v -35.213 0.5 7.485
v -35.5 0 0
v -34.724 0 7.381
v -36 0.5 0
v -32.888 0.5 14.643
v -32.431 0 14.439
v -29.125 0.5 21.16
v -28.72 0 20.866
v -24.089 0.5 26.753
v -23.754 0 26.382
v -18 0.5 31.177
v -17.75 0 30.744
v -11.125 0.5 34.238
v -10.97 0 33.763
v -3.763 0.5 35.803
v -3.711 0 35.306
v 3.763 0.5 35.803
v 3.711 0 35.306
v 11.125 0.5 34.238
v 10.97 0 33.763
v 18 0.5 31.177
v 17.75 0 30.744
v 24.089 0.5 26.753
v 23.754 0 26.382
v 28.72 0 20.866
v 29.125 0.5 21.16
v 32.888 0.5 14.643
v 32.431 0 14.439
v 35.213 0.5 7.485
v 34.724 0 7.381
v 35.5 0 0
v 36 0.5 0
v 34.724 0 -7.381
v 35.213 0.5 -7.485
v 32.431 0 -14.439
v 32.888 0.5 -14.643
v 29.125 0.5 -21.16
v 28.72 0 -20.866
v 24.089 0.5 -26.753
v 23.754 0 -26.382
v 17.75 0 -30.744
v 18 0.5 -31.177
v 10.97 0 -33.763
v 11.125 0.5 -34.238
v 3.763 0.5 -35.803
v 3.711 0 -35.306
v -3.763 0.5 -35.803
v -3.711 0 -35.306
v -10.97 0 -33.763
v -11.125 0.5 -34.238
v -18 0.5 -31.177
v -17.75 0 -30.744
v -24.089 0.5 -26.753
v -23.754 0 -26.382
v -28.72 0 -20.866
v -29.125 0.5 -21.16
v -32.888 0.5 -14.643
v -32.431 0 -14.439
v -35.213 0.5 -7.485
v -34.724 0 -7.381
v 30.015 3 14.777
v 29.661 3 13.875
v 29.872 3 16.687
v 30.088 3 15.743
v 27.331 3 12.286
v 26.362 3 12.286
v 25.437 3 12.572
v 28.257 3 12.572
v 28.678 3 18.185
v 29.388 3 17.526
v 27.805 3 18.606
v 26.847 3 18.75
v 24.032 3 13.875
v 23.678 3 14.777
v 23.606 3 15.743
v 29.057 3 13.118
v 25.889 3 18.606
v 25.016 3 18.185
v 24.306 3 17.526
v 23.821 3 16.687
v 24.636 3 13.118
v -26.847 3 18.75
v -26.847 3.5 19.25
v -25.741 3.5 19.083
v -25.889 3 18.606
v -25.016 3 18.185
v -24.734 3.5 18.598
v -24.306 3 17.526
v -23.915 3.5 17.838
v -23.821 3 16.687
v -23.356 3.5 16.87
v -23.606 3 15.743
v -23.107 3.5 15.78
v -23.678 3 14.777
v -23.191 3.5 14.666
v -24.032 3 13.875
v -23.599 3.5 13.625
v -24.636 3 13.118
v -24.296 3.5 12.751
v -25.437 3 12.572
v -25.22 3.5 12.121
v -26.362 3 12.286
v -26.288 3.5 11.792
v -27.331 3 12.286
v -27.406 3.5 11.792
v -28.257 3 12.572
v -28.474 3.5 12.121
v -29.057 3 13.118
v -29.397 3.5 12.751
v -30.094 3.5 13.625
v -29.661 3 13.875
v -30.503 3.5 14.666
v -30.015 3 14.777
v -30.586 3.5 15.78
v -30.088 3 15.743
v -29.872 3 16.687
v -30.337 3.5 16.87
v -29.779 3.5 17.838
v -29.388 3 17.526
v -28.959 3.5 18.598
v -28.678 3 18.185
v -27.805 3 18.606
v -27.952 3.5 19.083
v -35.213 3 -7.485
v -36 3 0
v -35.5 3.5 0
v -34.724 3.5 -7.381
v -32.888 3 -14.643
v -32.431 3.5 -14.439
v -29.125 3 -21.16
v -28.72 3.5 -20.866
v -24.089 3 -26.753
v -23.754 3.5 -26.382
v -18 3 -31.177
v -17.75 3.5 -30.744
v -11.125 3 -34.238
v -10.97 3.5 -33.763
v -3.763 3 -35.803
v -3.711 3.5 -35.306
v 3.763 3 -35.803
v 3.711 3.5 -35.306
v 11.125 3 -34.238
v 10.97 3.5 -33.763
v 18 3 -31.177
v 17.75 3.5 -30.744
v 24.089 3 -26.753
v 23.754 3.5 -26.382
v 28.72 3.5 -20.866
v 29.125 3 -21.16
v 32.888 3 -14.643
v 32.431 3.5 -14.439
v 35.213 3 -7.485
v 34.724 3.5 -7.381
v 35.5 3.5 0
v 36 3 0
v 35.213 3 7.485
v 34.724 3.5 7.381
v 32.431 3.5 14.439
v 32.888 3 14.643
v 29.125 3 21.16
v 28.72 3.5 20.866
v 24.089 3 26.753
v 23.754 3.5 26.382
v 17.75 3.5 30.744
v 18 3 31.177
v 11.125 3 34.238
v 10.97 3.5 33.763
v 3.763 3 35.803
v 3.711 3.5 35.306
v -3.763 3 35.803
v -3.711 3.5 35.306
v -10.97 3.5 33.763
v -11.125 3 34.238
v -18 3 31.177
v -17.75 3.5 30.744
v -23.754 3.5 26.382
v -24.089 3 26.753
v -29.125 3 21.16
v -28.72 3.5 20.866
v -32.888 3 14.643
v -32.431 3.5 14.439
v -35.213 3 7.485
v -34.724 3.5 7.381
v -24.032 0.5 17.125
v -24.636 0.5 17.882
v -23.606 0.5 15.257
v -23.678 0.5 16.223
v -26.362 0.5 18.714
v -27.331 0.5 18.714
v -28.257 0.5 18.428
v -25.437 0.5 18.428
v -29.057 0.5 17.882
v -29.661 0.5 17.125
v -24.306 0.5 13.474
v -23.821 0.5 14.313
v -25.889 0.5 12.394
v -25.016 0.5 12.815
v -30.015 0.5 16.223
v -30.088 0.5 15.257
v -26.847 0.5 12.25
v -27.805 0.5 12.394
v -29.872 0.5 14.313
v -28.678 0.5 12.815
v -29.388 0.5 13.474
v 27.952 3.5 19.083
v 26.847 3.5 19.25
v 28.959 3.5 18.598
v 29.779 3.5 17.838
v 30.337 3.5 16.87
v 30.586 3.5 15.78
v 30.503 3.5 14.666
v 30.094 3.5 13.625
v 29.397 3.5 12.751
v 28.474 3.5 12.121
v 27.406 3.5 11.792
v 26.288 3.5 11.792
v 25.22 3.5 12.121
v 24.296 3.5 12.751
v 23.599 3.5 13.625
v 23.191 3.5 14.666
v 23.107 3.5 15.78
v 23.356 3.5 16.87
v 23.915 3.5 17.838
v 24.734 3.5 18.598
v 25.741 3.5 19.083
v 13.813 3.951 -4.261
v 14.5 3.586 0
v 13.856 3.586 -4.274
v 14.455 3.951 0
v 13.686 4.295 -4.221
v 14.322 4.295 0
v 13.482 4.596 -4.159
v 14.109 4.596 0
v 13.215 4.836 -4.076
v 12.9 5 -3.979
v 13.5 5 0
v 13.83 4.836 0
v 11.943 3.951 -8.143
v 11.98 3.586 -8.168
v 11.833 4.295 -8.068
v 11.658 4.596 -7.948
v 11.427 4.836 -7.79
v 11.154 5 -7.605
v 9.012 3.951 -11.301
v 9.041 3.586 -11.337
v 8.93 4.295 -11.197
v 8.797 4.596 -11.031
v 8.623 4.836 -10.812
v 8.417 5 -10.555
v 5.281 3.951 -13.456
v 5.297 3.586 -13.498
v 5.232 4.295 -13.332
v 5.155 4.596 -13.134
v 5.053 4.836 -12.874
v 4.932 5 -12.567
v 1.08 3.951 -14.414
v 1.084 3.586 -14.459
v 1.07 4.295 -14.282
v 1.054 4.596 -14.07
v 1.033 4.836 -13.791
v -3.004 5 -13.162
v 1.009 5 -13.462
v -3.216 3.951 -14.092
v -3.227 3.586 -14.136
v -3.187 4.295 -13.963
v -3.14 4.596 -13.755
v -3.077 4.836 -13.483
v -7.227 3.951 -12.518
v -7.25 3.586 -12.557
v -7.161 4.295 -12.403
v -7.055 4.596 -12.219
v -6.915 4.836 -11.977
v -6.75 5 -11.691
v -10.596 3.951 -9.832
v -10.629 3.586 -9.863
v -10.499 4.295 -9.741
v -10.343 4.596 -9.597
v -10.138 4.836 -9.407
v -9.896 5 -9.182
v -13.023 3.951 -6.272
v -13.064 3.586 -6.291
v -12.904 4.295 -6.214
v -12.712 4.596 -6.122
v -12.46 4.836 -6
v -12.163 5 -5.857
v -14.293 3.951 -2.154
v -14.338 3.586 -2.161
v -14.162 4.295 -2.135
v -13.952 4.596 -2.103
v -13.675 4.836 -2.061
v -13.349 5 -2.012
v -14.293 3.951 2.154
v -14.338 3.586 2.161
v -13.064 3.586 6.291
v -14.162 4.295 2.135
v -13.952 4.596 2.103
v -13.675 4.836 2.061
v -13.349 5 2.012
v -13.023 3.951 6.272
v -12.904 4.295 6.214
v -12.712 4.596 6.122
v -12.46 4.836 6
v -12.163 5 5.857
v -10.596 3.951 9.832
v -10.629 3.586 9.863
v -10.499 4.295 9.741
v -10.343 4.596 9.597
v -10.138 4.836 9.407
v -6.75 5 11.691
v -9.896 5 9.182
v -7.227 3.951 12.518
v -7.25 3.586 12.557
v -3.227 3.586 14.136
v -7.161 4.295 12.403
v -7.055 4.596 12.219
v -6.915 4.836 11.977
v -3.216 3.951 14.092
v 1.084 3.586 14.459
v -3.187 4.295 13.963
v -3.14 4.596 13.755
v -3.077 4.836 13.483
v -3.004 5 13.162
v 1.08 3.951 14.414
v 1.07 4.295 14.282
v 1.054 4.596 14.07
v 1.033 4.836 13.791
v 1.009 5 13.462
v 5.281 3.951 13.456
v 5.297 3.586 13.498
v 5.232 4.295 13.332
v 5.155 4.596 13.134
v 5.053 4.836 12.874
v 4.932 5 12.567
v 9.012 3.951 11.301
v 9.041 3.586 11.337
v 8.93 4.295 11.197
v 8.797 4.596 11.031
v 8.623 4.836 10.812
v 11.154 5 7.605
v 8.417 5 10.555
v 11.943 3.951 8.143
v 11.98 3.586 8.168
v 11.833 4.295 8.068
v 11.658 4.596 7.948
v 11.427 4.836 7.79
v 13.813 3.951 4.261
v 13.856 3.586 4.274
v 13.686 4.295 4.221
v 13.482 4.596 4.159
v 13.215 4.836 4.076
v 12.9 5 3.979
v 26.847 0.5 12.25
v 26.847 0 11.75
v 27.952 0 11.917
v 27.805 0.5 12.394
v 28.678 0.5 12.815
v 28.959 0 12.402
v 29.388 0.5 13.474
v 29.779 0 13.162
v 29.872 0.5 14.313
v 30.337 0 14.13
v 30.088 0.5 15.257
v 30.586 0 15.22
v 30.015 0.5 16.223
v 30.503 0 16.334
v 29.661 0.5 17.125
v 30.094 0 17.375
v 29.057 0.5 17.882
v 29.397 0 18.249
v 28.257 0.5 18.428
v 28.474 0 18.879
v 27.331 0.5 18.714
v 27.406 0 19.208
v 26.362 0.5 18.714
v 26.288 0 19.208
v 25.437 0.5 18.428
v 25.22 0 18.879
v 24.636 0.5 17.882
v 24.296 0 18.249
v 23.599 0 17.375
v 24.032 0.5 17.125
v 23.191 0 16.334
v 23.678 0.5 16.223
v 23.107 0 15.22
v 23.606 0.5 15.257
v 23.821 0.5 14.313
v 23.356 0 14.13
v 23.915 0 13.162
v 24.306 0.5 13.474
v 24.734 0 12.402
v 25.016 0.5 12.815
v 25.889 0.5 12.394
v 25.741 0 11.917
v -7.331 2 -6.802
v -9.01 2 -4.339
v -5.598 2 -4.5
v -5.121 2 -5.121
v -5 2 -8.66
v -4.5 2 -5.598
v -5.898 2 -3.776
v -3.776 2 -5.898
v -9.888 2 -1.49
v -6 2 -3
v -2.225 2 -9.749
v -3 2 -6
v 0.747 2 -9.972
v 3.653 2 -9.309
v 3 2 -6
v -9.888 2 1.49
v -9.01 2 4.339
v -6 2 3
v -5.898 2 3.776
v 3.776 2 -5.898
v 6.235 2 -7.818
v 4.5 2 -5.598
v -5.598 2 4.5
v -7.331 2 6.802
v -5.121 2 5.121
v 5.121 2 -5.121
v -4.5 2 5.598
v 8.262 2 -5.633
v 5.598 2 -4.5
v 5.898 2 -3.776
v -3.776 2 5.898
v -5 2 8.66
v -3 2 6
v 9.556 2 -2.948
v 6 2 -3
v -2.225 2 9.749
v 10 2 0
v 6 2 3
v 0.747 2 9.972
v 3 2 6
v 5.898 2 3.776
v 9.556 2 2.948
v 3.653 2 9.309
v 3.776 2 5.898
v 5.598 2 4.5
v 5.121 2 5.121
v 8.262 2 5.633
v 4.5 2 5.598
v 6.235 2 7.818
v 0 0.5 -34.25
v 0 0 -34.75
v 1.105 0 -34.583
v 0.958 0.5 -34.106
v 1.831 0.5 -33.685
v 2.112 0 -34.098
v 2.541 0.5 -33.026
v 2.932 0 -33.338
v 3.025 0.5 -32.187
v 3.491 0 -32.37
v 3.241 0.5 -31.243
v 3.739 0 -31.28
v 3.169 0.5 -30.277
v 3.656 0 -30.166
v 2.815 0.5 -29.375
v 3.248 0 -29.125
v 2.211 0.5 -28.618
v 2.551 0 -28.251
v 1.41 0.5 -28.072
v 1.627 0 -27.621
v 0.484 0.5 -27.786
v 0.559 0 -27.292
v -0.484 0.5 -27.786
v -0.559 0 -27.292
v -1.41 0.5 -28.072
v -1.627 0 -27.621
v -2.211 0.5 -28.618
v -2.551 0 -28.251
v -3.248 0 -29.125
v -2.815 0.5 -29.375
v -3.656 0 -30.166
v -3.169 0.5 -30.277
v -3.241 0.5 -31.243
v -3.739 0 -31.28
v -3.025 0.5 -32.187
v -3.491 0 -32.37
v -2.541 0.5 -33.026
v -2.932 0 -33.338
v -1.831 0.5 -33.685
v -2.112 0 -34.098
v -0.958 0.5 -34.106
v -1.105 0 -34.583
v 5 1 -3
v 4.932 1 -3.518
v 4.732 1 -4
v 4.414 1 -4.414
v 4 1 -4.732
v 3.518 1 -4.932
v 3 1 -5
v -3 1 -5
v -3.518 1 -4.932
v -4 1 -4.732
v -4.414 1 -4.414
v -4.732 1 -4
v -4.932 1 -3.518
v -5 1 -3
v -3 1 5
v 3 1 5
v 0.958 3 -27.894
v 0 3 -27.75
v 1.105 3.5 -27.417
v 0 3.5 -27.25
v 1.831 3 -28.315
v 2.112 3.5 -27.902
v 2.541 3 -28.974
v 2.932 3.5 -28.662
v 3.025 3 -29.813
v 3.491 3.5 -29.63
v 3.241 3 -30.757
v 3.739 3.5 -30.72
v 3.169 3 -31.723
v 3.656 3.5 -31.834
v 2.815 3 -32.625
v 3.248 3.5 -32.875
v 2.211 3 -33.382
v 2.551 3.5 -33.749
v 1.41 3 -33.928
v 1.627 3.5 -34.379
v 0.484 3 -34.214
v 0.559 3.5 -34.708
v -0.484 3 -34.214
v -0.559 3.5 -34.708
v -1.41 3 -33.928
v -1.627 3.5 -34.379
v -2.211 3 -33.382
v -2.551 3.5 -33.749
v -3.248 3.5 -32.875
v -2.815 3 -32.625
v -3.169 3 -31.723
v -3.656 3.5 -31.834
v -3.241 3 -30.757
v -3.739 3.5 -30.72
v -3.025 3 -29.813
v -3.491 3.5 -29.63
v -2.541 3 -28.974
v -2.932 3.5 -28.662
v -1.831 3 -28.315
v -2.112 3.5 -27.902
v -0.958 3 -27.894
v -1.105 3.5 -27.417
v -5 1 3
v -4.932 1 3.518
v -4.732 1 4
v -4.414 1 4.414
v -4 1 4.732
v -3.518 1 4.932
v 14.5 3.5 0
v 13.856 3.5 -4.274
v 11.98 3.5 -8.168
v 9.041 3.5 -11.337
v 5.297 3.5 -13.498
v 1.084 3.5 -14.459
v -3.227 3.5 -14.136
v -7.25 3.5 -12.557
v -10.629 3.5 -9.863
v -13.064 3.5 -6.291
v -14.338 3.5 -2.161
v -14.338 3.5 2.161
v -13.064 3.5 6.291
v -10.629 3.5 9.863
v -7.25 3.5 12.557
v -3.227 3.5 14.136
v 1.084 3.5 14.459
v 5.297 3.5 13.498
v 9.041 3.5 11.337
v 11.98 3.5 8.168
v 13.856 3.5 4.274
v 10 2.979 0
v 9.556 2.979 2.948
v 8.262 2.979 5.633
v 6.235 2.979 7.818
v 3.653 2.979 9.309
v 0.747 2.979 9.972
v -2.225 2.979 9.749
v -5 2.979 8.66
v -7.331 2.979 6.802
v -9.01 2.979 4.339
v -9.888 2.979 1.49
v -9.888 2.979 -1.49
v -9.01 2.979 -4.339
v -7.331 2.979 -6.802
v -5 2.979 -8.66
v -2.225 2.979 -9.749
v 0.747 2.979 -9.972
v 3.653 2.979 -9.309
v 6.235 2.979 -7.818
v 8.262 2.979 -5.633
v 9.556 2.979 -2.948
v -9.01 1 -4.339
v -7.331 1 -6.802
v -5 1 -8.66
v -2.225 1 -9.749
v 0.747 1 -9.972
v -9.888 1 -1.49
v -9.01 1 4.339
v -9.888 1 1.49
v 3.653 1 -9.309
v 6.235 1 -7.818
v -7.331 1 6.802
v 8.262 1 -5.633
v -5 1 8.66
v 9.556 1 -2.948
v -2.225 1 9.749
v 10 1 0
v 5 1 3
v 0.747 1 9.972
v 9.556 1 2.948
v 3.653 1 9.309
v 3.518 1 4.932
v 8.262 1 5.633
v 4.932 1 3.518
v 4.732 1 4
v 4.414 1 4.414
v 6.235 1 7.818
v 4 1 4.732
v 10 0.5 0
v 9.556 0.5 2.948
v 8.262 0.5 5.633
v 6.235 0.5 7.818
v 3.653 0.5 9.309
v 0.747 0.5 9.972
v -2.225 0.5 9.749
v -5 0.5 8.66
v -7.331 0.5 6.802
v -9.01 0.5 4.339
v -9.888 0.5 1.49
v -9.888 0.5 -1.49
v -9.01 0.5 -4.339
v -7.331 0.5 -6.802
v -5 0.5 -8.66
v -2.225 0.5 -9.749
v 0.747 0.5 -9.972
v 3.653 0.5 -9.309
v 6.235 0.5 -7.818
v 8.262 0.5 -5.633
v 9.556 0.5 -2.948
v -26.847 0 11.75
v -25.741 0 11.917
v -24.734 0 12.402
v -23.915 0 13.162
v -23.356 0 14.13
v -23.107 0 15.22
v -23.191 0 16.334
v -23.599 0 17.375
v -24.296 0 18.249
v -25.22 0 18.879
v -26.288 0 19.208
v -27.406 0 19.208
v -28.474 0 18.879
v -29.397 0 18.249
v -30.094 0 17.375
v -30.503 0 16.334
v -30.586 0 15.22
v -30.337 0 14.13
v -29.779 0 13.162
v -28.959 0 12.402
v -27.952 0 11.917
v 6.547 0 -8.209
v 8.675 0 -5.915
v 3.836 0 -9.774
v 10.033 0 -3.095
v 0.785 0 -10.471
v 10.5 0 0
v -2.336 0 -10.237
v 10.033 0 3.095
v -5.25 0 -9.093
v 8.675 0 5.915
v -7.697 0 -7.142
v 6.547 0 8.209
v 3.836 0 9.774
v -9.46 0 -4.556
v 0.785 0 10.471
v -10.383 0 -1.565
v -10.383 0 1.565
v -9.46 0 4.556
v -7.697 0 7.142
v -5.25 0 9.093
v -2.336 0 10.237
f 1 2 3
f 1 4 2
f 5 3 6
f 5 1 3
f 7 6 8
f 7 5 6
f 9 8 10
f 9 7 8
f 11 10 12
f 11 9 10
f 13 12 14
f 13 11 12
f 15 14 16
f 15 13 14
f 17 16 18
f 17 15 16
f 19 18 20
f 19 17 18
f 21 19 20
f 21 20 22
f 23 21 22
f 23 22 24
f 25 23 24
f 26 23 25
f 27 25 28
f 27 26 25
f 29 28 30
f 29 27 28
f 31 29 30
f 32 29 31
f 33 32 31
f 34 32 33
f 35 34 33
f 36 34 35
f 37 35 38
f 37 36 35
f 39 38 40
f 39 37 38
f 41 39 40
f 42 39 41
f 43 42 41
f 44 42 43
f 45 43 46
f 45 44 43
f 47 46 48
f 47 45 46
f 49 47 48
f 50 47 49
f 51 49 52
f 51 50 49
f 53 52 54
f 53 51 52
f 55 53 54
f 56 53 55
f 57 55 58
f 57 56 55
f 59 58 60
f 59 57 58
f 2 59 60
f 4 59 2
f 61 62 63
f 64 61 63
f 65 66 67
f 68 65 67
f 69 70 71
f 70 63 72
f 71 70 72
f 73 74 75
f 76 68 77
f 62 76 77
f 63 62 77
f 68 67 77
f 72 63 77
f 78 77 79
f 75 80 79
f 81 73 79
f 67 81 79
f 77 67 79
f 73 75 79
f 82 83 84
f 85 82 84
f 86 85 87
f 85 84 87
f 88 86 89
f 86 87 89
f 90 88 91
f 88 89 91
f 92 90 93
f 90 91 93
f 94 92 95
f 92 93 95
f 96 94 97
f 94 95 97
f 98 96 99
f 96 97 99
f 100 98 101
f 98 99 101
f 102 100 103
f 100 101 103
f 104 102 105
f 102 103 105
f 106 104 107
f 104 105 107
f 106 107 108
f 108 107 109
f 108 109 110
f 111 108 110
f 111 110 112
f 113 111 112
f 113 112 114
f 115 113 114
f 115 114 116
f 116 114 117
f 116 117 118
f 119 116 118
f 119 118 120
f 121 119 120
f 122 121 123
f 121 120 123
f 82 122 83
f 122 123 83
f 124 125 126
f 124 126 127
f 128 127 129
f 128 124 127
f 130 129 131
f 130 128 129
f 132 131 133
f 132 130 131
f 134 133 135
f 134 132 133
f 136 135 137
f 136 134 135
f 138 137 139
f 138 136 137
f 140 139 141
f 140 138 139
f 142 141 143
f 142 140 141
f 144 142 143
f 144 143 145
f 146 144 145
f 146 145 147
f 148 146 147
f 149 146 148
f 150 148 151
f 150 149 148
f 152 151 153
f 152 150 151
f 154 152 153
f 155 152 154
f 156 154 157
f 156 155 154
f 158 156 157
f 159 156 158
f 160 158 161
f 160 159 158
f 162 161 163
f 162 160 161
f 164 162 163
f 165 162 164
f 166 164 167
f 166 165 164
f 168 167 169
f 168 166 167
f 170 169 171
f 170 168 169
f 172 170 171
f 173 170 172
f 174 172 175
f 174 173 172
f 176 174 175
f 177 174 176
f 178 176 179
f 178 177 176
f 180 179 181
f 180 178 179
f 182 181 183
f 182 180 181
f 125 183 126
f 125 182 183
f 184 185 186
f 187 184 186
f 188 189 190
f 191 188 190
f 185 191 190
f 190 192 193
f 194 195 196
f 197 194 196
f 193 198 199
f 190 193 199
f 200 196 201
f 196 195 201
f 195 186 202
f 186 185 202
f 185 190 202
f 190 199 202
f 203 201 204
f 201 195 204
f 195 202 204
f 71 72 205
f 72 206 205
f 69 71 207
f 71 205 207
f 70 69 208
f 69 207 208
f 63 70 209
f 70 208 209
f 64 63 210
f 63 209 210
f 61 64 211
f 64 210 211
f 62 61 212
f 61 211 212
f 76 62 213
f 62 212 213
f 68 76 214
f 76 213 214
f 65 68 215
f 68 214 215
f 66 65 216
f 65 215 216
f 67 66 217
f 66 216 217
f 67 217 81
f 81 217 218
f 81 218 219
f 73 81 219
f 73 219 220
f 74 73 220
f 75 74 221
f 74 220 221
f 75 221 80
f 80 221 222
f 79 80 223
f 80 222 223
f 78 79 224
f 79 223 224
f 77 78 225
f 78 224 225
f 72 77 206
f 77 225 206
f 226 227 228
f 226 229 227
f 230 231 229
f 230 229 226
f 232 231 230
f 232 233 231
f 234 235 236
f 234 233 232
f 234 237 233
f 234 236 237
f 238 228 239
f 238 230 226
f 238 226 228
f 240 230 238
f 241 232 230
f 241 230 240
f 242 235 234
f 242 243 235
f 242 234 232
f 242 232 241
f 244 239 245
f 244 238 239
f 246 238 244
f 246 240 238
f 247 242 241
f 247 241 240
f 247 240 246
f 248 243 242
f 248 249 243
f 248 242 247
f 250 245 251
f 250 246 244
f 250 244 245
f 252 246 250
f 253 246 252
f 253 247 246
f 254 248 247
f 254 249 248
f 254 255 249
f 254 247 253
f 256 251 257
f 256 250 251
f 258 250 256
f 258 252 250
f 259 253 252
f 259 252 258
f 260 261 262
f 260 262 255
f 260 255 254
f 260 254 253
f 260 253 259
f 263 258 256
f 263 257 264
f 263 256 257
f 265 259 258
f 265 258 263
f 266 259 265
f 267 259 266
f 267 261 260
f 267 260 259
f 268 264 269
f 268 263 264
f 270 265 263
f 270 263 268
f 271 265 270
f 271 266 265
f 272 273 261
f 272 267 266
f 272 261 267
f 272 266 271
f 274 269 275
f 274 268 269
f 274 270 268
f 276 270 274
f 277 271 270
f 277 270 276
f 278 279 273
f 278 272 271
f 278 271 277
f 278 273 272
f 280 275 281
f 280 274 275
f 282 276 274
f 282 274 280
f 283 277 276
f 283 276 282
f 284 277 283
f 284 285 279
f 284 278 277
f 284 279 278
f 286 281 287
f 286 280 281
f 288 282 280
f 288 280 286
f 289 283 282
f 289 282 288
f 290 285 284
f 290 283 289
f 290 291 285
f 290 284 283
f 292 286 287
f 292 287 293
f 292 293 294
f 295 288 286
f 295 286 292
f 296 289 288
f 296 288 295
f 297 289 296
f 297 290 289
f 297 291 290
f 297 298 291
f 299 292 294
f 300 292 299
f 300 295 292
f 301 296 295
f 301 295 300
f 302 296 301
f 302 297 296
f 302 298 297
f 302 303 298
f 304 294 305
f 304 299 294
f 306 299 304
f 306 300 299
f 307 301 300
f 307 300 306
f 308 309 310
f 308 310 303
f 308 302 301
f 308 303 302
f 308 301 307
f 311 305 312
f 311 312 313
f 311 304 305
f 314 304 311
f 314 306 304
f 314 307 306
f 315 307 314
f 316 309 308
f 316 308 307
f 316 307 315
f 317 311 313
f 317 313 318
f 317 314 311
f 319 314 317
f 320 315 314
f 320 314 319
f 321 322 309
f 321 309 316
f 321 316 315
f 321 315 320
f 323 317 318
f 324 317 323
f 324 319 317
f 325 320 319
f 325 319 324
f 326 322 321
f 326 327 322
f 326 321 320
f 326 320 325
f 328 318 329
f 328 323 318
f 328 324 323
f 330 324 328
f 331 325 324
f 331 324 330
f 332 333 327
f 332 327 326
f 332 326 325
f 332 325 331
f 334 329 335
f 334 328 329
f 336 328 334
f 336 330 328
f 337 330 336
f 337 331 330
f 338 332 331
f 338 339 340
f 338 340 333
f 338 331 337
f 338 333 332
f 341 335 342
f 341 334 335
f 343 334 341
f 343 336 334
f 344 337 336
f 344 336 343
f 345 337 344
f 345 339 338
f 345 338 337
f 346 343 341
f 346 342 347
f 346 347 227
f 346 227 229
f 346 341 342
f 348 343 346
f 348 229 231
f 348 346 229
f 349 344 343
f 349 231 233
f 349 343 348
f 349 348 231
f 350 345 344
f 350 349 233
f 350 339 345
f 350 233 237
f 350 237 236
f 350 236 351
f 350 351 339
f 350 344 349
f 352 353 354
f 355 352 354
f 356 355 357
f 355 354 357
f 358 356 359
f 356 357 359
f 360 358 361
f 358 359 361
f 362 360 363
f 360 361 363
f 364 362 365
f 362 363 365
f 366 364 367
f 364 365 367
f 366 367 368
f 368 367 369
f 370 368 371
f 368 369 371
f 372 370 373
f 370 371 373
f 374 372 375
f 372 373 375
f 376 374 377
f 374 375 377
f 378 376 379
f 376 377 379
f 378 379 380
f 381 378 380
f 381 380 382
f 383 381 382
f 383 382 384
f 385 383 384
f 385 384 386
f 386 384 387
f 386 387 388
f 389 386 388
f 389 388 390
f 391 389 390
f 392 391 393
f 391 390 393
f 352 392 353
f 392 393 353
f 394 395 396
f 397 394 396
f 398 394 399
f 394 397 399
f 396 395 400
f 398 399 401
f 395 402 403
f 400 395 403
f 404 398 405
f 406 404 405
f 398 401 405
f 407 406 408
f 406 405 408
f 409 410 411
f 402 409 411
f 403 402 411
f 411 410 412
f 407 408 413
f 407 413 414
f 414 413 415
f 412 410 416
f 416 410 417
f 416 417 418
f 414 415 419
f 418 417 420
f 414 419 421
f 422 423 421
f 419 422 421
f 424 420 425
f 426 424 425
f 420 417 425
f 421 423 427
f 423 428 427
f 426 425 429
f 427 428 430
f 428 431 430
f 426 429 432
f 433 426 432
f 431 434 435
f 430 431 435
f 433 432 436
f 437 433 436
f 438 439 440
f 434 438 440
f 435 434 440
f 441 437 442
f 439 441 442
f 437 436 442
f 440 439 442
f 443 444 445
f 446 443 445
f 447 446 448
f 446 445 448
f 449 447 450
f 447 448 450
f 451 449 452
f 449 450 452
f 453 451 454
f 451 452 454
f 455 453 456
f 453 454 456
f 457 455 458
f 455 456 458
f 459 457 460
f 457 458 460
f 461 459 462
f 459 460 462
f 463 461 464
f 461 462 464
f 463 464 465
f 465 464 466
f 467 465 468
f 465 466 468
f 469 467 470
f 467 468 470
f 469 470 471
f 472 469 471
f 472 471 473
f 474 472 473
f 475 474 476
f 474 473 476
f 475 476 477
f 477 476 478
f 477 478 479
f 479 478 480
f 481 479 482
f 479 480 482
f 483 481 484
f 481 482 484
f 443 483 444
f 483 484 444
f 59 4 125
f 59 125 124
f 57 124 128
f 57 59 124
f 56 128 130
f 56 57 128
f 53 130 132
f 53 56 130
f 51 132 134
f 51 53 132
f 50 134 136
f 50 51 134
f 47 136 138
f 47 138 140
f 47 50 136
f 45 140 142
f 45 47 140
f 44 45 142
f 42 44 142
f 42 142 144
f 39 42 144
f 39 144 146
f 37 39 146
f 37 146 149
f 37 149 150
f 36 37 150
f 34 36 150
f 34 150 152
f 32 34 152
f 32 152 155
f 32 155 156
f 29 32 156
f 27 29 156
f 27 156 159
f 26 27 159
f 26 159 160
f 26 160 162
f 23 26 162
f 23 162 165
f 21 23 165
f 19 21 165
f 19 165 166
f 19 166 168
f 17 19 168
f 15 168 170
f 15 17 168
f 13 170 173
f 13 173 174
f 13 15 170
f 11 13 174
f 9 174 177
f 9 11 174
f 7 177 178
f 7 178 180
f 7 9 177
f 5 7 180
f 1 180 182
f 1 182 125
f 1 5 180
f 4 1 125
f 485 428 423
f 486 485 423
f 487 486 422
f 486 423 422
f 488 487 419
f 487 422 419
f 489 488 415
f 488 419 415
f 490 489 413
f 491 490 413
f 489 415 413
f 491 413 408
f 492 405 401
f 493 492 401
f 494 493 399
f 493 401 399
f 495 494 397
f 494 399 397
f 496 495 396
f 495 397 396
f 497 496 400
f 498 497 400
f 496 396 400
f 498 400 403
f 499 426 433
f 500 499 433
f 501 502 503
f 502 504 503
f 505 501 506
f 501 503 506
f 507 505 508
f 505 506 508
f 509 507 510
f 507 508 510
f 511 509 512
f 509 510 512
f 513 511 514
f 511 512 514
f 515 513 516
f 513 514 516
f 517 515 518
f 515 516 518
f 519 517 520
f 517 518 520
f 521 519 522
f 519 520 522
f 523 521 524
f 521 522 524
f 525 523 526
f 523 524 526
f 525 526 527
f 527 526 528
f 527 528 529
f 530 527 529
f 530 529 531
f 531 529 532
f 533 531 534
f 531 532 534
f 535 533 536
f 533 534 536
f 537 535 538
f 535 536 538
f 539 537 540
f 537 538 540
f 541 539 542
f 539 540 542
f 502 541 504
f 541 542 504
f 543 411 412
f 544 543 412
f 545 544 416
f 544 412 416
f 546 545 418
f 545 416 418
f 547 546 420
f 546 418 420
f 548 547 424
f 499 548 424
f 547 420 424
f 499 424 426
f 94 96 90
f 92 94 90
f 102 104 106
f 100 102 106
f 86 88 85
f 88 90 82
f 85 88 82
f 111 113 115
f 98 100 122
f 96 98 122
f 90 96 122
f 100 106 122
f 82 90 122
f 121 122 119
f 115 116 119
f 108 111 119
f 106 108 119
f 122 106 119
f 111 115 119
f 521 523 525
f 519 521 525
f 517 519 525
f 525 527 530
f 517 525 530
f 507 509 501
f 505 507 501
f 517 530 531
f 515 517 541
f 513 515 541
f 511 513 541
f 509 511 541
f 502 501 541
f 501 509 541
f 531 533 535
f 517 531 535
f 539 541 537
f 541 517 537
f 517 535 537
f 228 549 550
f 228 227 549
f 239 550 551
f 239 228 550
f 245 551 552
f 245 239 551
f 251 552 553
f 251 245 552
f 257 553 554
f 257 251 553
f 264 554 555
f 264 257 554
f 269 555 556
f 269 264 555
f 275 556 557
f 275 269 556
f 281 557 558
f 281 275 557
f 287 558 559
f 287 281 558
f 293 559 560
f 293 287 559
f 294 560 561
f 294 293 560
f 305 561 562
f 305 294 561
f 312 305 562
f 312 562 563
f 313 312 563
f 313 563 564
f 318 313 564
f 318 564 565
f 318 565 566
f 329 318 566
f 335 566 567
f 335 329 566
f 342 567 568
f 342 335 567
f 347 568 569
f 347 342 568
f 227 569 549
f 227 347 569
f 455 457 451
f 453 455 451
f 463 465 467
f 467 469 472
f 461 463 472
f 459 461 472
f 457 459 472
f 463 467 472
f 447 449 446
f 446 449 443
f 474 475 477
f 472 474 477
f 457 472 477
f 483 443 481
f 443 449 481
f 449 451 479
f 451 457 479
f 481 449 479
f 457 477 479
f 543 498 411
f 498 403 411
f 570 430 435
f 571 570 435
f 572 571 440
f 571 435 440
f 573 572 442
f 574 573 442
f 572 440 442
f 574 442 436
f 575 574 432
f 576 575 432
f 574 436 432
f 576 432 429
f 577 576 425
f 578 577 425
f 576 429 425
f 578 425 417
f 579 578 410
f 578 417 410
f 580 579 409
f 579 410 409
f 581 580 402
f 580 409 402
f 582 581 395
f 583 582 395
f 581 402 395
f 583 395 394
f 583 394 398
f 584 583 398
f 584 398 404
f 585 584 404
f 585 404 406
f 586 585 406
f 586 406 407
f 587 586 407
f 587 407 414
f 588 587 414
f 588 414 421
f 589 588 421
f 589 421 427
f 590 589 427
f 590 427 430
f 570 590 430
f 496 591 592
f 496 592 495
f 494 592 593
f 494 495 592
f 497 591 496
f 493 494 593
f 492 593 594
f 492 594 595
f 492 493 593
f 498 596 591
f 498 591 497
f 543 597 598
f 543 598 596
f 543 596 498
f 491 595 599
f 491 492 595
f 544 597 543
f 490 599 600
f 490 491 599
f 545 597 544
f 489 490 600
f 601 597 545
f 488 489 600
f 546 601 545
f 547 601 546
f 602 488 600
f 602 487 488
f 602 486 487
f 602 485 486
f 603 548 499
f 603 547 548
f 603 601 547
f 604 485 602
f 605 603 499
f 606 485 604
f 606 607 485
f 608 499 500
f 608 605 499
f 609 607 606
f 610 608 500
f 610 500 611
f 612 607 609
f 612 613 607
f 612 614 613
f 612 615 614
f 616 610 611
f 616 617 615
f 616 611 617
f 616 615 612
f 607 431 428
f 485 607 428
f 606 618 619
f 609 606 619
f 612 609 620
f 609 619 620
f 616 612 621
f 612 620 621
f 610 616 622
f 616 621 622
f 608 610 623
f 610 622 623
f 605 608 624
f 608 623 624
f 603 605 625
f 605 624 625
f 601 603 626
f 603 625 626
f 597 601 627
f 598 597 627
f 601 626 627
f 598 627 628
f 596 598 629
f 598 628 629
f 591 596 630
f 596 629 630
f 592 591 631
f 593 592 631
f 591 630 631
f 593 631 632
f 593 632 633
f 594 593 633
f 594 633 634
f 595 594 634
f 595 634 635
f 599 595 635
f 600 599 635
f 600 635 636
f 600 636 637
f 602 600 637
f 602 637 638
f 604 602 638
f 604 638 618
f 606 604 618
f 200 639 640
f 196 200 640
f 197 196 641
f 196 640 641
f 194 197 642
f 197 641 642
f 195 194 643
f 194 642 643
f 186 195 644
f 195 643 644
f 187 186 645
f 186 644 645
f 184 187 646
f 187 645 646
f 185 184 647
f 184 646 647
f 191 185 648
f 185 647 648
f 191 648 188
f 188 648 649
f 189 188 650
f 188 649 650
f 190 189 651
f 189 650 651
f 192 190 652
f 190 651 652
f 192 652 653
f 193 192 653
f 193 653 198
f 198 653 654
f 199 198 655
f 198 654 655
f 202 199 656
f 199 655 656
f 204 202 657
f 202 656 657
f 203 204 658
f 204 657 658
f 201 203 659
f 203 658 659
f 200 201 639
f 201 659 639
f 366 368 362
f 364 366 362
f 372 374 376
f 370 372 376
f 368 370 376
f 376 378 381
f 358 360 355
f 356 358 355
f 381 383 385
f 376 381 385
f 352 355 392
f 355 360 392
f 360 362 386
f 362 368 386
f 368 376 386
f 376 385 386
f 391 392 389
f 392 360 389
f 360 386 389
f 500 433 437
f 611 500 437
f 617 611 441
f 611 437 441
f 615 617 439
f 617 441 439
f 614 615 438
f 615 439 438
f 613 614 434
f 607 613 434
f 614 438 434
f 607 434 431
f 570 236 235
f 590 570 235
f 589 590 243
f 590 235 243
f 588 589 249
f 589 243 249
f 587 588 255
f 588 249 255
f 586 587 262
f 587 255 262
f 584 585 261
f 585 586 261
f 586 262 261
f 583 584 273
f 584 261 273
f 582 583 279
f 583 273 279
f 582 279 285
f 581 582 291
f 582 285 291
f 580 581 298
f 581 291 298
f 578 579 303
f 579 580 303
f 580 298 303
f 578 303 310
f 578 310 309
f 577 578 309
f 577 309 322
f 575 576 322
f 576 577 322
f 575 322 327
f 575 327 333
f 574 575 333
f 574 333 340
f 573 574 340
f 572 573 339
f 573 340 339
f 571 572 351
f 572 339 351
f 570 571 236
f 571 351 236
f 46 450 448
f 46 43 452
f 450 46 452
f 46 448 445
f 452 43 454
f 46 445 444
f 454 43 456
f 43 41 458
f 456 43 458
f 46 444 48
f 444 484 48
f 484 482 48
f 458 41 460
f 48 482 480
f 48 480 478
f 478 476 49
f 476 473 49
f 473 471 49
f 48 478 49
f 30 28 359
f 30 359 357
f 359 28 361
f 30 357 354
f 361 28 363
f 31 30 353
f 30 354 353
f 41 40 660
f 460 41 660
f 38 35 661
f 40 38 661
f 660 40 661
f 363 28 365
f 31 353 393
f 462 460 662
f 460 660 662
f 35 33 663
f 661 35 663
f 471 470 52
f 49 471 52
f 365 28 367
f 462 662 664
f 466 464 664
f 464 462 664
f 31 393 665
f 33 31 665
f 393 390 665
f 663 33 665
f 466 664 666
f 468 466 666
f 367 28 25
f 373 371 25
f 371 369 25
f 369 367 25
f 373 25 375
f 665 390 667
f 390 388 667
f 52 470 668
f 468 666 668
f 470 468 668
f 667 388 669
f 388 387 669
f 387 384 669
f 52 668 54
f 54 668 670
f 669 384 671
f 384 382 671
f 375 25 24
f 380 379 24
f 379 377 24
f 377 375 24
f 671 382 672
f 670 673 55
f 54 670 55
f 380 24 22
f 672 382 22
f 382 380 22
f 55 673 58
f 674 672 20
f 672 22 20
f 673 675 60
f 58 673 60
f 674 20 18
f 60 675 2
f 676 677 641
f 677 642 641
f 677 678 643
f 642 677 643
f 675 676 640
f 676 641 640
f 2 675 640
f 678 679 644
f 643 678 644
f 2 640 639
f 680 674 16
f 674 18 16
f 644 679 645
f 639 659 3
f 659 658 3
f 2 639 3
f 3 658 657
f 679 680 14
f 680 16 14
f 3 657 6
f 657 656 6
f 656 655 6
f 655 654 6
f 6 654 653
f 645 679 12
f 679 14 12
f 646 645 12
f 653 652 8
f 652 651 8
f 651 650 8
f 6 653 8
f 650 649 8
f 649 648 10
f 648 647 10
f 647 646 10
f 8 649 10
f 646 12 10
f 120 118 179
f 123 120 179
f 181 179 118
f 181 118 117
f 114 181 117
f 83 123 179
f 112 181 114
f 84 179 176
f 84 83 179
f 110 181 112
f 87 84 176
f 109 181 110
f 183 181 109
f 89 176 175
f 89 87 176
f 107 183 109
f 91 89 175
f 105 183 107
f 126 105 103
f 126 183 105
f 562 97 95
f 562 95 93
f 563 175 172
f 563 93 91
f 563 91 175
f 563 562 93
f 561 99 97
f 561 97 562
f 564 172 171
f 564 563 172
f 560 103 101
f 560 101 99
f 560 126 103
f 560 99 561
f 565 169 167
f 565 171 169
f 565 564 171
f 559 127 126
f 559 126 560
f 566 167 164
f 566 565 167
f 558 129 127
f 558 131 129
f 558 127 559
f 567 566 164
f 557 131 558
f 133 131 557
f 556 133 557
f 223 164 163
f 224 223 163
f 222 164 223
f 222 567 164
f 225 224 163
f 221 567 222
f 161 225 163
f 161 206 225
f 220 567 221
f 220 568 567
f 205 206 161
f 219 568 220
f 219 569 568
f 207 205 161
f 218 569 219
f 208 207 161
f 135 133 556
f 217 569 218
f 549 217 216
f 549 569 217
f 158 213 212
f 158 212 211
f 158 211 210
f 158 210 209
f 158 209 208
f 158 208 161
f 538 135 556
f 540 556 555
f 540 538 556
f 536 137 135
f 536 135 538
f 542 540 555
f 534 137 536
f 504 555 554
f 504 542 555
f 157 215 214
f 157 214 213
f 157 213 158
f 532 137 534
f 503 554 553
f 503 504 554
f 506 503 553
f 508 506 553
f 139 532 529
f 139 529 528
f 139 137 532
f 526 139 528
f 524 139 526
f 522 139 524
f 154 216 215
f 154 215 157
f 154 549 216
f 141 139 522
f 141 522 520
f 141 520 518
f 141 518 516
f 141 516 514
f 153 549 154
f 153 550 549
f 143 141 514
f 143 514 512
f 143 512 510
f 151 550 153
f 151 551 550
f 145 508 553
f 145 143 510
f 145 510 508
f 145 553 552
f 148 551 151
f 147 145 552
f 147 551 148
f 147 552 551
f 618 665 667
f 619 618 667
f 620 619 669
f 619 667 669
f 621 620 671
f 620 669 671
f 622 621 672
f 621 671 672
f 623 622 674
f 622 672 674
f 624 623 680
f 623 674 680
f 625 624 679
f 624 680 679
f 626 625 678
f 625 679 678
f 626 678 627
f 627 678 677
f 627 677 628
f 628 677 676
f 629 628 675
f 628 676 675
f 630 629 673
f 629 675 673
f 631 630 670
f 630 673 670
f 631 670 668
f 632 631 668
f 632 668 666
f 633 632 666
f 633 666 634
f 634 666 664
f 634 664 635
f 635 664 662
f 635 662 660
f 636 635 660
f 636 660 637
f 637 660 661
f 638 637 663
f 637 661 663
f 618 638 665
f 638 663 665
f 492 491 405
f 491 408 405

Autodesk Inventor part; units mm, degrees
ref_plane "YZ Plane" through (0, 0, 0) normal (1, 0, 0) x (0, 1, 0)
ref_plane "XZ Plane" through (0, 0, 0) normal (0, 1, 0) x (-1, 0, 0)
sketch "Main Platform" plane through (0, 0, 0) normal (0, 1, 0) x (-1, 0, 0)
  circle A0 centre (0, 0) radius 36
  dimension "d0" = 72
extrude "Main Platform Extrusion" add sketch "Main Platform" along normal blind 5
sketch "Main Hole" plane through (0, 0, 0) normal (0, -1, 0) x (1, 0, 0)
  circle A0 centre (0, 0) radius 36 construction
  circle A1 centre (0, 0) radius 10
  dimension "d3" = 20
extrude "Main Hole Cutout" cut sketch "Main Hole" against normal through all
sketch "Bottom Magnet Holes (MASTER)" plane through (0, 0, 0) normal (0, -1, 0) x (1, 0, 0)
  circle A0 centre (0, 0) radius 10 construction
  circle A1 centre (0, 0) radius 36 construction
  circle A2 centre (0, 0) radius 36 construction
  line L0 (0, -50.4) -> (0, 50.4) construction
  line L1 (0, 36) -> (0, -36) construction
  circle A3 centre (0, 0) radius 31 construction
  line L2 (0, 0) -> (26.8468, 15.5) construction
  line L3 (0, 0) -> (-26.8468, 15.5) construction
  line L4 (0, 0) -> (0, -31) construction
  dimension "d37" = 5
  dimension "d38" = 120
  dimension "d39" = 120
chamfer "Saline Well" distance 3.5 angle 30 1 edges at (-10, 5, 0) measured on face at (-27.0099, 5, -2.7674)
sketch "Top Magnet Holes" plane through (0, 5, 0) normal (0, 1, 0) x (1, 0, 0)
  circle A0 centre (0, 0) radius 31 construction
  point P0 (26.8468, -15.5)
  point P1 (-26.8468, -15.5)
  point P2 (0, 31)
ref_plane "Shim Holder Plane" through (0, 1, 0) normal (0, -1, 0) x (1, 0, 0)
sketch "Shim Holder" plane through (0, 1, 0) normal (0, -1, 0) x (1, 0, 0)
  circle A0 centre (0, 0) radius 36 construction
  circle A1 centre (0, 0) radius 13.5 construction
  circle A2 centre (0, 0) radius 15
  dimension "d137" = 30
extrude "Shim Holder Extrusion" add sketch "Shim Holder" against normal blind 1
sketch "Sketch22" plane through (0, 5, 0) normal (0, 1, 0) x (1, 0, 0)
  circle A0 centre (0, 0) radius 36 construction
  circle A1 centre (0, 0) radius 13.5 construction
  circle A2 centre (0, 0) radius 14.5
  circle A3 centre (0, 0) radius 36
  dimension "d110" = 1
extrude "Saline Well Recess" cut sketch "Sketch22" against normal blind 1.5
fillet "Fillet4" radius 1.5 1 edges at (-14.5, 5, 0)
hole "Top Magnet Recess" at (26.8468, 5, 15.5) at (0, 5, -31) at (-26.8468, 5, 15.5) direction (0, -1, 0) diameter 6.5 depth 2
hole "Bottom Magnet Recess" at (26.8468, 0, 15.5) at (0, 0, -31) at (-26.8468, 0, 15.5) direction (0, 1, 0) diameter 6.5 depth 0.5
chamfer "Chamfer6" distance 0.5 angle 45 9 edges at (36, 0, 0) (0, 0, -27.75) (26.8468, 0, 18.75) (-26.8468, 0, 18.75) (36, 3.5, 0) (-26.8468, 3.5, 12.25) (26.8468, 3.5, 12.25) (0, 3.5, -34.25) (-10, 0, 0)
sketch "Sketch25" plane through (0, 1, 0) normal (0, -1, 0) x (1, 0, 0)
  line L0 (-3, 5) -> (3, 5)
  line L1 (5, 3) -> (5, -3)
  line L2 (3, -5) -> (-3, -5)
  line L3 (-5, -3) -> (-5, 3)
  line L4 (-5, 5) -> (5, -5) construction
  line L5 (5, 5) -> (-5, -5) construction
  arc A0 (3, -5) -> (5, -3) centre (3, -3) ccw
  arc A1 (-5, -3) -> (-3, -5) centre (-3, -3) ccw
  arc A2 (-3, 5) -> (-5, 3) centre (-3, 3) ccw
  arc A3 (5, 3) -> (3, 5) centre (3, 3) ccw
  point P0 (0, 0)
  point P1 (0, 0)
  dimension "d140" = 10
  dimension "d141" = 10
  dimension "d142" = 2
extrude "Extrusion14" cut sketch "Sketch25" against normal through all
chamfer "Chamfer9" distance 1 angle 45 8 edges at (5, 2, 0) (4.4142, 2, 4.4142) (0, 2, 5) (-4.4142, 2, 4.4142) (-5, 2, 0) (-4.4142, 2, -4.4142) (0, 2, -5) (4.4142, 2, -4.4142)
properties part number "flat_platform_v1_mm"
